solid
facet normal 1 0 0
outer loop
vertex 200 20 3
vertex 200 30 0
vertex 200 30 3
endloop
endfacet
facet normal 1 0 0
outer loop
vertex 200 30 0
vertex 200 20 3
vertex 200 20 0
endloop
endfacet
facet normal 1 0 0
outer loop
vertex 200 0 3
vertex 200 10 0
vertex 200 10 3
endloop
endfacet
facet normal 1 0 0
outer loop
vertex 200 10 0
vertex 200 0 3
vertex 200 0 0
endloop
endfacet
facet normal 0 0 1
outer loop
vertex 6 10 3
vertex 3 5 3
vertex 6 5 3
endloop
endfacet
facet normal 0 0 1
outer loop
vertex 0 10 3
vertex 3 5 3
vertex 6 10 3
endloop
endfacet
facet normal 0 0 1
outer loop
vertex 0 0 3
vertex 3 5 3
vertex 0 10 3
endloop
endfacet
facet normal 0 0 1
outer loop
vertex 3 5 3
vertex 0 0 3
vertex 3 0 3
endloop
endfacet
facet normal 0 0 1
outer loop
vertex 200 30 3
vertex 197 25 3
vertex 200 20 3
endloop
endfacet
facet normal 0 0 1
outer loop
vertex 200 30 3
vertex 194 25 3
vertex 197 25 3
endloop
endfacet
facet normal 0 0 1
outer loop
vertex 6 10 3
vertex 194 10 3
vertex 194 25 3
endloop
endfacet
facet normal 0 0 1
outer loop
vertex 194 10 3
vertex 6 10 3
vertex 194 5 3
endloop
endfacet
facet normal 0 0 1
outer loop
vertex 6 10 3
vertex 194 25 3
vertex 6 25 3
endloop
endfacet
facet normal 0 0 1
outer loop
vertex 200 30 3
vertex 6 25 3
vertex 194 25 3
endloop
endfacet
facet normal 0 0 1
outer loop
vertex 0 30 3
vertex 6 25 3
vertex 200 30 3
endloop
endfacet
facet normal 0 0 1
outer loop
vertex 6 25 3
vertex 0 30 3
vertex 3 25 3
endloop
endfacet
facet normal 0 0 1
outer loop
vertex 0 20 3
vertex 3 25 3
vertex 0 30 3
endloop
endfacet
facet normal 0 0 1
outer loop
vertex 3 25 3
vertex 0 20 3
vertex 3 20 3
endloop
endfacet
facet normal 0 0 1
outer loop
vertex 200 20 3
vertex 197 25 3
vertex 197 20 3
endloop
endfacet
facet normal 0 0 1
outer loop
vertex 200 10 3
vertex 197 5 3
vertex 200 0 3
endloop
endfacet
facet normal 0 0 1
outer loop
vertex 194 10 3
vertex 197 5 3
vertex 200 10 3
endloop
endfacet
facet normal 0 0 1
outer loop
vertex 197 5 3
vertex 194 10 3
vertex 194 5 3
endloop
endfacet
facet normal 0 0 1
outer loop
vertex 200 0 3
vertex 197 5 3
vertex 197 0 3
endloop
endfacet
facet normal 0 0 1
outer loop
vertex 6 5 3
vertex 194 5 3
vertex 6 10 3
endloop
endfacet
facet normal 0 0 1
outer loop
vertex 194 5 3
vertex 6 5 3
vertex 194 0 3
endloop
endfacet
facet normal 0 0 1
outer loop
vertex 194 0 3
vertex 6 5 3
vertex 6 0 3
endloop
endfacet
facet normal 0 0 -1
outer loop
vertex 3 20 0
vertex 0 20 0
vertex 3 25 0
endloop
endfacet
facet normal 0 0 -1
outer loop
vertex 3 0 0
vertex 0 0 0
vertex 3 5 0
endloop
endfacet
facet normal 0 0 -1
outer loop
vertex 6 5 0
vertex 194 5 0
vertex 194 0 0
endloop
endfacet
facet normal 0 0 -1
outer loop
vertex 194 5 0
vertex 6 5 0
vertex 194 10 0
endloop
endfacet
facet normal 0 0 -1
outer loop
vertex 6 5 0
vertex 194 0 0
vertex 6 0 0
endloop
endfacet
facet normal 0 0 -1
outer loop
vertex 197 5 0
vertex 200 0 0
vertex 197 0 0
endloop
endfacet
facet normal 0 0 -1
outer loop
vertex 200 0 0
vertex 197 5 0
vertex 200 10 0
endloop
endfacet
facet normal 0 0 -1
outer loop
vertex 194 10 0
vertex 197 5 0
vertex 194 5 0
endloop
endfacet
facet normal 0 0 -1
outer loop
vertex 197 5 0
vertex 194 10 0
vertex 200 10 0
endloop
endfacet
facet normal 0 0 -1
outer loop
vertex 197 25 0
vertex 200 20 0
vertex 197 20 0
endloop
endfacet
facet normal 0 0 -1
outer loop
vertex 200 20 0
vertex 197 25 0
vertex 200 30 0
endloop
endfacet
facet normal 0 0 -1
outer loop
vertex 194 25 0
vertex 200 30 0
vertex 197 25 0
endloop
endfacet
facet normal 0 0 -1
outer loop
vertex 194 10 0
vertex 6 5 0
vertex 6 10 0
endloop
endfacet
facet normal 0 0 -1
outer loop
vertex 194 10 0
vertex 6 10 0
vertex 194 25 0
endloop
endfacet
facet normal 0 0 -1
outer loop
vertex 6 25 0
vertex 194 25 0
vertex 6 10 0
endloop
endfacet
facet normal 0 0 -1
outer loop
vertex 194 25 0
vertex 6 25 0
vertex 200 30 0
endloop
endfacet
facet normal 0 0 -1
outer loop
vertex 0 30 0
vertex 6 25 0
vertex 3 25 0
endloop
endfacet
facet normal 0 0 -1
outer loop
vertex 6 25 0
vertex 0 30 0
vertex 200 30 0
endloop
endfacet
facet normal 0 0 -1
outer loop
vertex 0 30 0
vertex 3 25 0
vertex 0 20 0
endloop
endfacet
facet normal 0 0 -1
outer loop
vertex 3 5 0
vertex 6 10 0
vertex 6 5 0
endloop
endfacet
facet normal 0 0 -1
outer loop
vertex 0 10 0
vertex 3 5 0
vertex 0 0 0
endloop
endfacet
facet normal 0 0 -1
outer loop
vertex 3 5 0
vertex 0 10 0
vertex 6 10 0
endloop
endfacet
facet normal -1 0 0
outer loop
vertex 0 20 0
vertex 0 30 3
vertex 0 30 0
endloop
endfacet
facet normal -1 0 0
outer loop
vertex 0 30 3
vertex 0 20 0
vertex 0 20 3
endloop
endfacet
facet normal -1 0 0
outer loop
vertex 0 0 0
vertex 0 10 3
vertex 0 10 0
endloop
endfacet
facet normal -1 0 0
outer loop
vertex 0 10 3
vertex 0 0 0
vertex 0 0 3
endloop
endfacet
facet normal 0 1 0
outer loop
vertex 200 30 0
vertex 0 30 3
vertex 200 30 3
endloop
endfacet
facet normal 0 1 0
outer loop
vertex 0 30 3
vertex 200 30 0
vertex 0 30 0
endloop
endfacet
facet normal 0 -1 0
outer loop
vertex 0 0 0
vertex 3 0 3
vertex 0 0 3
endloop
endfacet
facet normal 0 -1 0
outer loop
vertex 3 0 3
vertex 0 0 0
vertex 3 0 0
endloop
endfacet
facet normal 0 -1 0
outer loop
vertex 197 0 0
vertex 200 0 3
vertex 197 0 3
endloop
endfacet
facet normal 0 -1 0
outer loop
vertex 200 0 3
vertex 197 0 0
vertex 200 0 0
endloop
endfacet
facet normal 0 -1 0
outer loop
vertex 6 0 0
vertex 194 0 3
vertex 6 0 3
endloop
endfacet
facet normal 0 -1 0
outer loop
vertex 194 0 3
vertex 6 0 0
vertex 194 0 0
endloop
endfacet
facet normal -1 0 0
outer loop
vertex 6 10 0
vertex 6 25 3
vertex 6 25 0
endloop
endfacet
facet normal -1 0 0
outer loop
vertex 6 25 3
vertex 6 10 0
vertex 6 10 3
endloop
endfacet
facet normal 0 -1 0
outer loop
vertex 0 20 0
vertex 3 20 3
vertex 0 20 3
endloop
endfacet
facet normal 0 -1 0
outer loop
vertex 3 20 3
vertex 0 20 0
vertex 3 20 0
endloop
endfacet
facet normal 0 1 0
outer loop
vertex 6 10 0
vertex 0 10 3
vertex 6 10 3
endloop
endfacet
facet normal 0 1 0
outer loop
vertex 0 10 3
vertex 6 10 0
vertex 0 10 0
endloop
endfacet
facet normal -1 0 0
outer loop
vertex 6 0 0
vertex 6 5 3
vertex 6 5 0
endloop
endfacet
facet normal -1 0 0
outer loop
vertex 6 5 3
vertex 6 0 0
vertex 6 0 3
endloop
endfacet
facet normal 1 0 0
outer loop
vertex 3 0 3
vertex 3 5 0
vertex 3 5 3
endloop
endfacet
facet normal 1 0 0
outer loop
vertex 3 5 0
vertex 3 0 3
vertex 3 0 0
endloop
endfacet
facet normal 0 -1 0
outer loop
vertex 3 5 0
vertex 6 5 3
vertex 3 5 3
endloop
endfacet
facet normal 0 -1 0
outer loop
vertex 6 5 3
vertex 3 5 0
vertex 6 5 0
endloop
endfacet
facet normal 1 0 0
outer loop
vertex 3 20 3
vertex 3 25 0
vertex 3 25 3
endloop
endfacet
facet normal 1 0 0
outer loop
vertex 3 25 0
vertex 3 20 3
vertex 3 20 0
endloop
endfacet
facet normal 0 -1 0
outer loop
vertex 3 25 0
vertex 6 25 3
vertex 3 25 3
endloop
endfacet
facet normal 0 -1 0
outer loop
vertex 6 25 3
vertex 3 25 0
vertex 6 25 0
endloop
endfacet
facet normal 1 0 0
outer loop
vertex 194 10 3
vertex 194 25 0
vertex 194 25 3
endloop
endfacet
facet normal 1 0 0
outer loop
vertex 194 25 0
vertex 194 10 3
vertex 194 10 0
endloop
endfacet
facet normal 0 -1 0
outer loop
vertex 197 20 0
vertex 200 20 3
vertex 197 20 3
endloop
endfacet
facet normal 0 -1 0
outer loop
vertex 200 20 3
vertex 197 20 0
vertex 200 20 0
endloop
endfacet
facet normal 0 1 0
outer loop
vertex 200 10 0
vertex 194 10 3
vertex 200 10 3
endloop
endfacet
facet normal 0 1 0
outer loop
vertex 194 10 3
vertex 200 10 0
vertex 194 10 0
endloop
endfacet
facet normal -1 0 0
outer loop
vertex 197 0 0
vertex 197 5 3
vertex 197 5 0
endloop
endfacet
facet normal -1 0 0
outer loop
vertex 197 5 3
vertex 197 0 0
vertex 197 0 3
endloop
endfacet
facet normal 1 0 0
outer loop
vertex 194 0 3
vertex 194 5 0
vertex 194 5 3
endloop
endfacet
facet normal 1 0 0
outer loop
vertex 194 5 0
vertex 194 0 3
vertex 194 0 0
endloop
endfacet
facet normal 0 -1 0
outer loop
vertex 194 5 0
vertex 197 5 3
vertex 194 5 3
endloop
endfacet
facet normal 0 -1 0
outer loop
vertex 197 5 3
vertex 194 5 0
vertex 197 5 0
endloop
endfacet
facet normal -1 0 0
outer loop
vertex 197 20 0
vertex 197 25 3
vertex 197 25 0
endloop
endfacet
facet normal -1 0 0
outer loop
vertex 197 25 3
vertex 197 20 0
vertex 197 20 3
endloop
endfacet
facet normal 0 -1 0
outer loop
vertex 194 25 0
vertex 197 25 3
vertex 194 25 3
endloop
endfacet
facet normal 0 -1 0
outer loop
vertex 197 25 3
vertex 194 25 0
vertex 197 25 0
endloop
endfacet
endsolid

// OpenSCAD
//Universal car stand for 1/10 touring car

plate = 3;
width = 80;
height = 80; 

length = 200;

mounthole = 10;

union() {

difference() {
	cube([length,30,plate]);

	translate([0,10,0])
	rotate([0,0,0])
	cube([6,10,plate], center = false);
	
	translate([3,0,0])
	rotate([0,0,0])
	cube([3,5,plate], center = false);
	translate([3,20,0])
	rotate([0,0,0])
	cube([3,5,plate], center = false);

	translate([length-6,10,0])
	rotate([0,0,0])
	cube([6,10,plate], center = false);
	
	translate([length-6,0,0])
	rotate([0,0,0])
	cube([3,5,plate], center = false);
	translate([length-6,20,0])
	rotate([0,0,0])
	cube([3,5,plate], center = false);

}


}
